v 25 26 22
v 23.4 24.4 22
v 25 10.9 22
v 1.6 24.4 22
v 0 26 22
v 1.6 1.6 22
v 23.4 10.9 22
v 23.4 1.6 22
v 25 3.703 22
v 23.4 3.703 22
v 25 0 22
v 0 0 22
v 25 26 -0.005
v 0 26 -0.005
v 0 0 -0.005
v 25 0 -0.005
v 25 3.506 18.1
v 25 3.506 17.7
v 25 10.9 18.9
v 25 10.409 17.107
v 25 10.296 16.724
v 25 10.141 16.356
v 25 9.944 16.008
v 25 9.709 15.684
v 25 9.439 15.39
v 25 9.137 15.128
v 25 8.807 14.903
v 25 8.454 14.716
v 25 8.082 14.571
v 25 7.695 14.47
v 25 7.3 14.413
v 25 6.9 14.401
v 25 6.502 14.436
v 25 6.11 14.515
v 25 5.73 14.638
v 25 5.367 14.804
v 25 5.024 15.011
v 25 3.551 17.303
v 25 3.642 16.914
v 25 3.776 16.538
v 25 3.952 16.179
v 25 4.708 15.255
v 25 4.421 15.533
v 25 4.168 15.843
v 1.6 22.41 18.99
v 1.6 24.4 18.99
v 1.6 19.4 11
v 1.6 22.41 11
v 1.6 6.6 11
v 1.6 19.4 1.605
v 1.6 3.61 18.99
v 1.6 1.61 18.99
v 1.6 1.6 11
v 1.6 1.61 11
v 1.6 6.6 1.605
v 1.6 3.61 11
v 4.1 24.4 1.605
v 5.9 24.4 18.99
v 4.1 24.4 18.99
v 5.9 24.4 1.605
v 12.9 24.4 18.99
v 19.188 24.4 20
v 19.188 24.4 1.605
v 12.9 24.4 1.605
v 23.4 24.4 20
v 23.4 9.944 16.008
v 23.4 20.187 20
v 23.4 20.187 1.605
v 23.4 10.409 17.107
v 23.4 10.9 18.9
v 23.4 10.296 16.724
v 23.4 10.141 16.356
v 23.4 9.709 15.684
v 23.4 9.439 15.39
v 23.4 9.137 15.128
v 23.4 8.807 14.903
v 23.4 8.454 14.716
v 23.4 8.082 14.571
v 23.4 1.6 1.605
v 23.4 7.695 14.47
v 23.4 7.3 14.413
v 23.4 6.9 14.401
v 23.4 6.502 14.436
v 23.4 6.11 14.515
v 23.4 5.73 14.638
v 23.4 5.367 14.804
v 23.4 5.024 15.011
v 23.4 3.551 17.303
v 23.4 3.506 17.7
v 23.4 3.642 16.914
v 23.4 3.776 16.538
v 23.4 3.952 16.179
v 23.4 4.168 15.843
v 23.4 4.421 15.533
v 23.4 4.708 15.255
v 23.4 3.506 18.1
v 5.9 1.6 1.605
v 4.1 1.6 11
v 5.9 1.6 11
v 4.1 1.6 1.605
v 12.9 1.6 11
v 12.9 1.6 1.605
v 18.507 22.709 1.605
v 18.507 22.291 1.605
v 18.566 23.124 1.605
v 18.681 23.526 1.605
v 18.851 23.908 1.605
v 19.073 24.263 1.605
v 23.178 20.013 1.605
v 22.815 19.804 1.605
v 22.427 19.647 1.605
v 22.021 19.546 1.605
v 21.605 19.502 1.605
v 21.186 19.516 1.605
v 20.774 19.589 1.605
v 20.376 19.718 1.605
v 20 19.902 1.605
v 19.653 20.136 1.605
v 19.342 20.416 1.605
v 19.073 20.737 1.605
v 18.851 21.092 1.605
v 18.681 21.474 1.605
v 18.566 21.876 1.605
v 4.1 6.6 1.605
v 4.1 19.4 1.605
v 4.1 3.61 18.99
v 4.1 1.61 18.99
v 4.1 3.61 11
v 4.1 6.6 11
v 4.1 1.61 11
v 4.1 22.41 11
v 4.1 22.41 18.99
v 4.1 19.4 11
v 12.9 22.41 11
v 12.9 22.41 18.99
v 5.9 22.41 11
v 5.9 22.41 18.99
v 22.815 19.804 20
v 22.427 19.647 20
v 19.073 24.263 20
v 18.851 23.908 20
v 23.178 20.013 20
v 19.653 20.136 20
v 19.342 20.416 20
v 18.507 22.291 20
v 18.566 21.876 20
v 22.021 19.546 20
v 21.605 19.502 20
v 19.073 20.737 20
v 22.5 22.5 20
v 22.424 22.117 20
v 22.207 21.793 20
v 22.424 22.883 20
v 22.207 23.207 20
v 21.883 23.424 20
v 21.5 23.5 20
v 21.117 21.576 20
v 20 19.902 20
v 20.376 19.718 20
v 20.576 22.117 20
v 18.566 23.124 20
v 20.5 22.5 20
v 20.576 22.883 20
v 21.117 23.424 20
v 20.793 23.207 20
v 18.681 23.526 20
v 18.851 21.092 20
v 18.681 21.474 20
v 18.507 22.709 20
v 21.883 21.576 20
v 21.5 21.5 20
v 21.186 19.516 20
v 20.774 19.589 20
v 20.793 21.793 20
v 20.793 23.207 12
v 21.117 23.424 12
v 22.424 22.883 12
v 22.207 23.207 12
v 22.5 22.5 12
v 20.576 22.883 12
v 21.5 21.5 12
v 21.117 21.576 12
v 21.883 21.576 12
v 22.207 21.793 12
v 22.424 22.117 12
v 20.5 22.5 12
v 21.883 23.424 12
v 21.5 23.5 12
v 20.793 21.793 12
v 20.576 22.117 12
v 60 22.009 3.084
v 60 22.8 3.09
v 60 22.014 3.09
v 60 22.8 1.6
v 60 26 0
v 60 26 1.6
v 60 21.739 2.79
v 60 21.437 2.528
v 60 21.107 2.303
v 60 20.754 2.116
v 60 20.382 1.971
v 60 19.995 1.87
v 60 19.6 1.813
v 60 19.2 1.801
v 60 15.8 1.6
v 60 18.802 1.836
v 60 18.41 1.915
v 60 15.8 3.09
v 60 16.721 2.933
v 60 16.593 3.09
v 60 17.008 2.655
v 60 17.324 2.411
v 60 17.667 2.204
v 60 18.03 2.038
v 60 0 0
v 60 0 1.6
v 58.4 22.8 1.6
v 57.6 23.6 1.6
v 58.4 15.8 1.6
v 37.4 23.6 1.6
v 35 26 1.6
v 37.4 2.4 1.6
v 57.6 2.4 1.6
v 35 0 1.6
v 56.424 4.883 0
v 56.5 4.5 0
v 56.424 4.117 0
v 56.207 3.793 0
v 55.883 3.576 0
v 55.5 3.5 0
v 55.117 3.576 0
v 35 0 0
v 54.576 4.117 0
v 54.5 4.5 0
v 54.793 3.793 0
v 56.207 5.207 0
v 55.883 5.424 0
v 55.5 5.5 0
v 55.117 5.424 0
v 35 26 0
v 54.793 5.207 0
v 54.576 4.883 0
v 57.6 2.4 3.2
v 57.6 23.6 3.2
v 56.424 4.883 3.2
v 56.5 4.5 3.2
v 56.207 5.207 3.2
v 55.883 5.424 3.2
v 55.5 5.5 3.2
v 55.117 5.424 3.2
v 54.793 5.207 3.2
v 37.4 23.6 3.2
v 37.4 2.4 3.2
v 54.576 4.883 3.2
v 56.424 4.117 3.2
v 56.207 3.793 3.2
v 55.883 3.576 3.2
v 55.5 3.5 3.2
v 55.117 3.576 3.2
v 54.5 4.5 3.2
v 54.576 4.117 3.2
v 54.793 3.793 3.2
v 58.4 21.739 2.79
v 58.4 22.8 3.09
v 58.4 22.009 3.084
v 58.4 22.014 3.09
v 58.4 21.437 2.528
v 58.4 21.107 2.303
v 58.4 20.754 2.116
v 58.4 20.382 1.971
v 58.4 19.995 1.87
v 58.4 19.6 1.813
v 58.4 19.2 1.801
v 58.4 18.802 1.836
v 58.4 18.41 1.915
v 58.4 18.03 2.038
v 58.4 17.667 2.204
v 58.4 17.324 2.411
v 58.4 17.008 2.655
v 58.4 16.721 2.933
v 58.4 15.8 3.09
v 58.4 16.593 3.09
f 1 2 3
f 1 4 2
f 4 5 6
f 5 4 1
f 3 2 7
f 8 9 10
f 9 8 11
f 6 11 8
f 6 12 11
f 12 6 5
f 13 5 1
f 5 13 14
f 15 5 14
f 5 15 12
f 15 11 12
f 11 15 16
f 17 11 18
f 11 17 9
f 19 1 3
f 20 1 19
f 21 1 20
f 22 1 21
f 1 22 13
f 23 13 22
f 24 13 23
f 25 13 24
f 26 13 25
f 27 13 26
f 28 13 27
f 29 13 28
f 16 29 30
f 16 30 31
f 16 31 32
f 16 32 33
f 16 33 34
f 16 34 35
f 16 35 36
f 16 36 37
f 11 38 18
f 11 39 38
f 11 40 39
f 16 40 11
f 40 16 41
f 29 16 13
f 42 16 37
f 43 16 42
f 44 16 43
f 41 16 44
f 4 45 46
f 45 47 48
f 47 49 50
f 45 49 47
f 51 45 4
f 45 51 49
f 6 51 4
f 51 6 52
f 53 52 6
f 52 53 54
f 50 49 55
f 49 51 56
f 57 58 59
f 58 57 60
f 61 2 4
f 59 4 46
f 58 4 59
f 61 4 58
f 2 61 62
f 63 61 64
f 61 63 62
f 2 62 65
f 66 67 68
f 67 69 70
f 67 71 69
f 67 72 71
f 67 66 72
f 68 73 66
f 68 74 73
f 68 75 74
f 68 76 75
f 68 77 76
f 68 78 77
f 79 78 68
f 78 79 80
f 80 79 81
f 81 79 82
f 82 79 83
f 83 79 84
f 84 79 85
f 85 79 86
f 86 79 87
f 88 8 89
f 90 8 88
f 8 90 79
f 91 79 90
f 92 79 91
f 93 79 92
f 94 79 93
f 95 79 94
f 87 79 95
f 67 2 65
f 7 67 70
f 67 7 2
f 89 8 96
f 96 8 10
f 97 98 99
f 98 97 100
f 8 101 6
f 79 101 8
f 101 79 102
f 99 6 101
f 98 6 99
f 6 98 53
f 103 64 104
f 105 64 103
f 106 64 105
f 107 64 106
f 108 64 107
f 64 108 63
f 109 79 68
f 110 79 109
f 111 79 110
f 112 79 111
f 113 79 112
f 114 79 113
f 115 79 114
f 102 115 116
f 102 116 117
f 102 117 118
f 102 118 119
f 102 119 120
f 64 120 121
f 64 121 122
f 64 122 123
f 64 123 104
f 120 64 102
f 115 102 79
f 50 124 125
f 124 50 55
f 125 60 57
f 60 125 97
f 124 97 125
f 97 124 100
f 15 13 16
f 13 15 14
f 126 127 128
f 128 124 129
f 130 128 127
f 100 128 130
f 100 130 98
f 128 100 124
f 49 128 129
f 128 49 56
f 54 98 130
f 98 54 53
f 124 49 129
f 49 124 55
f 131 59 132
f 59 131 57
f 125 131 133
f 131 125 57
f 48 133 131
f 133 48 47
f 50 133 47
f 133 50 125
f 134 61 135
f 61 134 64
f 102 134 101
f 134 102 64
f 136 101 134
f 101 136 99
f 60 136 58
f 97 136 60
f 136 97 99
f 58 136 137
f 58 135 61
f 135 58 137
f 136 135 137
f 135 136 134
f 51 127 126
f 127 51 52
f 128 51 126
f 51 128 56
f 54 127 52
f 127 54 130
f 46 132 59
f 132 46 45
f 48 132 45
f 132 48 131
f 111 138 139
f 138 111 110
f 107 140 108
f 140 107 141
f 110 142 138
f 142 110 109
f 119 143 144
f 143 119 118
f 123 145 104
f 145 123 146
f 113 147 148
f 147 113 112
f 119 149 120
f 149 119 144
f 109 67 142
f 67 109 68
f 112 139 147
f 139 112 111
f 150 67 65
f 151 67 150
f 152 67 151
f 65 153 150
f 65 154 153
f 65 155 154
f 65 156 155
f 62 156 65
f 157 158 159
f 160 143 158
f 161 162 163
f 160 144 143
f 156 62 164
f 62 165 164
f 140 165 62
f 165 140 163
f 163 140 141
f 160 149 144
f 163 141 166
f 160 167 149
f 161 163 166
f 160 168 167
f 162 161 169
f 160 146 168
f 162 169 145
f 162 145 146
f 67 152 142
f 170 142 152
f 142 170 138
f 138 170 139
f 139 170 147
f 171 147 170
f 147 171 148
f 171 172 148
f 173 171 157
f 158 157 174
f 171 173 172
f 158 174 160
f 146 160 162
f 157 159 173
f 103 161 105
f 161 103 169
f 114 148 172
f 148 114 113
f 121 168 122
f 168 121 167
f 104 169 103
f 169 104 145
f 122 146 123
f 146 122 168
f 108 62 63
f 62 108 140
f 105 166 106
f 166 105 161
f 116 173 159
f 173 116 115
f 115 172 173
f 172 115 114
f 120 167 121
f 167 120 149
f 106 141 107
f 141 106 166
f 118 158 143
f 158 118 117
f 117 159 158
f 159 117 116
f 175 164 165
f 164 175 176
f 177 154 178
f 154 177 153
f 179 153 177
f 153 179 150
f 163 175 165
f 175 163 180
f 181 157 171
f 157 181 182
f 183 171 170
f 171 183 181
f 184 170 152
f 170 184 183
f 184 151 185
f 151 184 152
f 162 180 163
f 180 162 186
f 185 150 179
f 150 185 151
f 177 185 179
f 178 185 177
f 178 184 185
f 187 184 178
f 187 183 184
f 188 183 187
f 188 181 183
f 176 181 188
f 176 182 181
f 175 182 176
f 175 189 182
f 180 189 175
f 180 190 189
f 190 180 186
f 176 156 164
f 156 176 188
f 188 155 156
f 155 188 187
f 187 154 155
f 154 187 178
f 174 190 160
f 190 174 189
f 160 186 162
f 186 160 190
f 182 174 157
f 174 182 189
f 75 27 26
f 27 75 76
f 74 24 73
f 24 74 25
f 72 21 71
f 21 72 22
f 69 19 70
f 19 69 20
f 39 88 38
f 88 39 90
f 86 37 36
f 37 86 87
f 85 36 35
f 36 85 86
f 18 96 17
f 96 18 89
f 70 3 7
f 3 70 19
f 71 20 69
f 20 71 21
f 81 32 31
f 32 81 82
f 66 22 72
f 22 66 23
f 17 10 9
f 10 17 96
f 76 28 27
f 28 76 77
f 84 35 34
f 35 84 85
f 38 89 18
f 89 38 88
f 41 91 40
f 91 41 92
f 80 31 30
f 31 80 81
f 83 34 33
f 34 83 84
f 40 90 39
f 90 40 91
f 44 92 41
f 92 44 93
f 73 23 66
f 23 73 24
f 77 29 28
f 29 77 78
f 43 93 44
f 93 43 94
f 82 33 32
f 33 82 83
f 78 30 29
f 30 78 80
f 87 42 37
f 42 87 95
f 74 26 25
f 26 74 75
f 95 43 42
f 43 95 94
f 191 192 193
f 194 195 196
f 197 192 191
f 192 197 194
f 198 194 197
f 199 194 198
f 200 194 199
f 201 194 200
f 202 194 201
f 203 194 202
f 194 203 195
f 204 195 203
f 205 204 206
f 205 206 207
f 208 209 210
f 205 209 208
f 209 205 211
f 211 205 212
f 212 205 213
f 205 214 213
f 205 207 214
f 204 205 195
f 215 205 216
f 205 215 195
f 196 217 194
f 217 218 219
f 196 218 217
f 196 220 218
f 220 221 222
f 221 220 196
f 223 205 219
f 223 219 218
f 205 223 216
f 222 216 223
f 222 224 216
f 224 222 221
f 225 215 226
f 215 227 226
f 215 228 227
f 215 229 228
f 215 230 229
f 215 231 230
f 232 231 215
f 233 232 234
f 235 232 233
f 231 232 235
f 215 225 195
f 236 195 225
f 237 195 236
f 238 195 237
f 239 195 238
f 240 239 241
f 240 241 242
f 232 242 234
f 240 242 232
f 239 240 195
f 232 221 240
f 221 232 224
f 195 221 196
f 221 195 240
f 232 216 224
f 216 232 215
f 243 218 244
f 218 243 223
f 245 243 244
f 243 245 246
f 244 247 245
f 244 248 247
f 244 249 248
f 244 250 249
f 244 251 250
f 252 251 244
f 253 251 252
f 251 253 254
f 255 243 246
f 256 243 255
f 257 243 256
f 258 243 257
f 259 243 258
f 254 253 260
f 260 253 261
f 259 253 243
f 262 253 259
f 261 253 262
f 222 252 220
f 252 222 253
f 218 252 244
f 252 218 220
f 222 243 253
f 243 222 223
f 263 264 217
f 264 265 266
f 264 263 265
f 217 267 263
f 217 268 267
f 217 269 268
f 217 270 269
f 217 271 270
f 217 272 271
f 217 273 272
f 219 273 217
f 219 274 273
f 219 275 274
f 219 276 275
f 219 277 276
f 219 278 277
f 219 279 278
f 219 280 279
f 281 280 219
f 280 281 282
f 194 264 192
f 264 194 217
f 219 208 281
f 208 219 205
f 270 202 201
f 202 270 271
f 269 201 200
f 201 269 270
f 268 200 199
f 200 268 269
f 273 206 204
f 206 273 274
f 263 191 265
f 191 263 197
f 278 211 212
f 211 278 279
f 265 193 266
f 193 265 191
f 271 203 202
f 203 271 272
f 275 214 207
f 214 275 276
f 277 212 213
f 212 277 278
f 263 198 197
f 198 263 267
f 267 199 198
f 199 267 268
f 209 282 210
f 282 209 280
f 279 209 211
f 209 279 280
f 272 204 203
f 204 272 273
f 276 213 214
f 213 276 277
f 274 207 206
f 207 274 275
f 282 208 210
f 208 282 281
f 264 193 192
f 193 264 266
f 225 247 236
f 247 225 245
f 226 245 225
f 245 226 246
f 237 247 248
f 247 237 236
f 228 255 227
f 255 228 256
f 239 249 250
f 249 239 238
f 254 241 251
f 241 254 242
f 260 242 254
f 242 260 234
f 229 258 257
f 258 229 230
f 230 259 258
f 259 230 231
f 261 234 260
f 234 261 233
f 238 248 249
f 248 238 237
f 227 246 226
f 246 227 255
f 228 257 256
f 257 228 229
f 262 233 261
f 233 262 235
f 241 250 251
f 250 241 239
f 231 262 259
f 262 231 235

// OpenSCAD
// file: libraries/screwpost.scad
// generates screw posts 
// by Flint Million
// November 2023

module screwpost(h,r,t,sh)
{
    $fs=0.4;
    // Make a screw post.
    // h = height of entire post
    // r = radius of entire post
    // t = thickness of screw hole
    // sh = depth of screw hole

    difference() {
        // The main cylinder
        cylinder(h,r,r,$fa=360/45);
    
        // The screw hole
        translate([0,0,h - sh]) { cylinder(sh + 0.1,d=t); }
        // 0.1mm addition to translation/length to ensure the
        // hole "penetrates" the skin of the larger cylinder
    }
}
// file: libraries/openbox.scad
// generates an open-top box and lid
// by Flint Million
// November 2023

module openbox(size,ww=1.6,center=false) {

    // Generates a box with an open top.
    
    // size = dimensions of the box (either single value for cube or list for x,y,z)
    // ww = width of walls
    // center = center all axes over origin

    // Set the x, y, and z based on the input
    // if the input is a list, extract the three elements
    // otherwise copy the single element to all three axes (cube)
    x = is_list(size) ? size[0] : size;
    y = is_list(size) ? size[1] : size;
    z = is_list(size) ? size[2] : size;

    // Determine translate factors based on whether center is set or not
    // If center is not set box will sit in the positive quadrant entirely, starting at 0,0,0
    // If center is set box will be centered around the origin on all three axes
    tx = center ? 0 : x/2;
    ty = center ? 0 : y/2;
    tz = center ? -z/2 : 0;
    
    translate([tx,ty,tz]) {
        // Extrude and translate square and hole
         
        linear_extrude(height=z) 
        difference() {
            square([x,y],center=true);
            offset(-ww) square([x,y],center=true);
        }
        
        // Form the bottom of the box
        // Z is 0.01 units higher to avoid touching (not intersecting) walls
        translate([0,0,ww/2]) cube([x,y,ww+0.01],center=true);
    }
}

module openbox_lid(size,ww=1.6,offset=0.4,center=false) {
    // Generates a lid for a box made with openbox.
    
    // size = x and y dimensions of the box (either single value for square or list for x,y)
    // ww = width of walls
    // offset = How much smaller to make the inset (0.4mm is a good size - if it's exactly the same odds are the lid won't fit due to tolerances)
    // center = center all axes over origin

    x = is_list(size) ? size[0] : size;
    y = is_list(size) ? size[1] : size;
    
    tx = center ? -x/2 : 0;
    ty = center ? -y/2 : 0;
    tz = center ? -ww : 0;
    
    translate([tx,ty,tz]) {
        // Generate lid
        cube([x,y,ww]);
        // Generate inner lid
        translate([ww+offset,ww+offset,ww-0.01]) cube([x-(ww*2)-(offset*2),y-(ww*2)-(offset*2),ww+0.01]);
    }
}
// main file
use <libraries/openbox.scad>
use <libraries/screwpost.scad>

$fs = 0.4;

// Pieces of the part that will hold the GY521 board in place
module gy521_holder() {

    Y_MAX = GY_Y - (GY_WALL * 2);
    
    SHELF = 11;
    FRONT_THICK = 2.5;
    BOARD_THICK = 1.8;
    SIDE_THICK = 2;

    // bottom section
    cube([FRONT_THICK,5,SHELF]);
    translate([0,Y_MAX - 5,0]) cube([FRONT_THICK,5,SHELF]);
    
    translate([FRONT_THICK + BOARD_THICK,0,0]) cube([7,24,SHELF]);
    
    // top sections
    translate([FRONT_THICK + BOARD_THICK,Y_MAX - SIDE_THICK + 0.01,SHELF - 0.01]) cube([7,SIDE_THICK,8]);
    translate([0,0.01,SHELF - 0.01]) cube([FRONT_THICK,SIDE_THICK,8]);
    translate([0,Y_MAX - SIDE_THICK + 0.01,SHELF - 0.01]) cube([FRONT_THICK,SIDE_THICK,8]);
    
}

GY_X = 25;
GY_Y = 26;
GY_Z = 22;
GY_WALL = 1.6;

module gy521_main_box() {
    
    // Form the outer frame
    color("#480059") openbox([GY_X,GY_Y,GY_Z]);

    // Add the gy521 PCB holder
    color("#9000B2") translate([GY_WALL,GY_WALL,0]) gy521_holder();

    // Add the screw holder
    color("#f7e400") translate([GY_X - 3.5,GY_Y - 3.5,0]) screwpost(20,3,2,8);
    // Screw hole position is 3.5 + (3 - 1) = 5.5 from edges
    
    // TODO: add cutout for grommet, generate lid
}

module gy521_grommet_hole() {

    hull() {
        translate([GY_X - (GY_WALL * 1.5),3.9,GY_Z - 3.1]) cube([GY_WALL * 2,7,7]);

        translate([GY_X - (GY_WALL / 2),7,GY_Z - 4.1])
        // Rotate and move the grmmet hole
        rotate([90,0,90])
        translate([0,0,-1.6]) 
        // Form the main grommet hole
        cylinder(h=GY_WALL * 2,r=3.5,$fa=1);
    }
}

module gy521_grommet_stub() {
    
    difference() {
        // start with cuboid
        translate([(GY_X * 2) + 10 - GY_WALL, 0, GY_WALL]) cube([GY_WALL,7,7]);

        // subtract circle
        translate([(GY_X * 2) - 0.01 + 10,3.5,3.5+GY_WALL+0.2])
        rotate([90,0,90])
        translate([0,0,-1.6]) 
        cylinder(h=GY_WALL+0.02,r=3.5,$fa=1);

        // subtract upper half of cuboid
        translate([(GY_X * 2) + 9.99 - GY_WALL, -0.01, GY_WALL + 1.49]) cube([GY_WALL+0.02,7.02,7.02]);
    }
}

module gy521_lid() {
    color("#f7e400") translate([GY_X + 10,0,0]) openbox_lid([GY_X,GY_Y],1.6,offset=0.8);

    translate([0,GY_Y - (GY_WALL * 2) - 7,0]) gy521_grommet_stub();
}

// Generate pieces
difference() {
    gy521_main_box();
    gy521_grommet_hole();
}
difference() {
    gy521_lid();
    // subtract the screw hole
    translate([GY_X*2+10-4.5,4.5,-0.01]) cylinder(h=GY_WALL*2+0.02,r=1);
}
